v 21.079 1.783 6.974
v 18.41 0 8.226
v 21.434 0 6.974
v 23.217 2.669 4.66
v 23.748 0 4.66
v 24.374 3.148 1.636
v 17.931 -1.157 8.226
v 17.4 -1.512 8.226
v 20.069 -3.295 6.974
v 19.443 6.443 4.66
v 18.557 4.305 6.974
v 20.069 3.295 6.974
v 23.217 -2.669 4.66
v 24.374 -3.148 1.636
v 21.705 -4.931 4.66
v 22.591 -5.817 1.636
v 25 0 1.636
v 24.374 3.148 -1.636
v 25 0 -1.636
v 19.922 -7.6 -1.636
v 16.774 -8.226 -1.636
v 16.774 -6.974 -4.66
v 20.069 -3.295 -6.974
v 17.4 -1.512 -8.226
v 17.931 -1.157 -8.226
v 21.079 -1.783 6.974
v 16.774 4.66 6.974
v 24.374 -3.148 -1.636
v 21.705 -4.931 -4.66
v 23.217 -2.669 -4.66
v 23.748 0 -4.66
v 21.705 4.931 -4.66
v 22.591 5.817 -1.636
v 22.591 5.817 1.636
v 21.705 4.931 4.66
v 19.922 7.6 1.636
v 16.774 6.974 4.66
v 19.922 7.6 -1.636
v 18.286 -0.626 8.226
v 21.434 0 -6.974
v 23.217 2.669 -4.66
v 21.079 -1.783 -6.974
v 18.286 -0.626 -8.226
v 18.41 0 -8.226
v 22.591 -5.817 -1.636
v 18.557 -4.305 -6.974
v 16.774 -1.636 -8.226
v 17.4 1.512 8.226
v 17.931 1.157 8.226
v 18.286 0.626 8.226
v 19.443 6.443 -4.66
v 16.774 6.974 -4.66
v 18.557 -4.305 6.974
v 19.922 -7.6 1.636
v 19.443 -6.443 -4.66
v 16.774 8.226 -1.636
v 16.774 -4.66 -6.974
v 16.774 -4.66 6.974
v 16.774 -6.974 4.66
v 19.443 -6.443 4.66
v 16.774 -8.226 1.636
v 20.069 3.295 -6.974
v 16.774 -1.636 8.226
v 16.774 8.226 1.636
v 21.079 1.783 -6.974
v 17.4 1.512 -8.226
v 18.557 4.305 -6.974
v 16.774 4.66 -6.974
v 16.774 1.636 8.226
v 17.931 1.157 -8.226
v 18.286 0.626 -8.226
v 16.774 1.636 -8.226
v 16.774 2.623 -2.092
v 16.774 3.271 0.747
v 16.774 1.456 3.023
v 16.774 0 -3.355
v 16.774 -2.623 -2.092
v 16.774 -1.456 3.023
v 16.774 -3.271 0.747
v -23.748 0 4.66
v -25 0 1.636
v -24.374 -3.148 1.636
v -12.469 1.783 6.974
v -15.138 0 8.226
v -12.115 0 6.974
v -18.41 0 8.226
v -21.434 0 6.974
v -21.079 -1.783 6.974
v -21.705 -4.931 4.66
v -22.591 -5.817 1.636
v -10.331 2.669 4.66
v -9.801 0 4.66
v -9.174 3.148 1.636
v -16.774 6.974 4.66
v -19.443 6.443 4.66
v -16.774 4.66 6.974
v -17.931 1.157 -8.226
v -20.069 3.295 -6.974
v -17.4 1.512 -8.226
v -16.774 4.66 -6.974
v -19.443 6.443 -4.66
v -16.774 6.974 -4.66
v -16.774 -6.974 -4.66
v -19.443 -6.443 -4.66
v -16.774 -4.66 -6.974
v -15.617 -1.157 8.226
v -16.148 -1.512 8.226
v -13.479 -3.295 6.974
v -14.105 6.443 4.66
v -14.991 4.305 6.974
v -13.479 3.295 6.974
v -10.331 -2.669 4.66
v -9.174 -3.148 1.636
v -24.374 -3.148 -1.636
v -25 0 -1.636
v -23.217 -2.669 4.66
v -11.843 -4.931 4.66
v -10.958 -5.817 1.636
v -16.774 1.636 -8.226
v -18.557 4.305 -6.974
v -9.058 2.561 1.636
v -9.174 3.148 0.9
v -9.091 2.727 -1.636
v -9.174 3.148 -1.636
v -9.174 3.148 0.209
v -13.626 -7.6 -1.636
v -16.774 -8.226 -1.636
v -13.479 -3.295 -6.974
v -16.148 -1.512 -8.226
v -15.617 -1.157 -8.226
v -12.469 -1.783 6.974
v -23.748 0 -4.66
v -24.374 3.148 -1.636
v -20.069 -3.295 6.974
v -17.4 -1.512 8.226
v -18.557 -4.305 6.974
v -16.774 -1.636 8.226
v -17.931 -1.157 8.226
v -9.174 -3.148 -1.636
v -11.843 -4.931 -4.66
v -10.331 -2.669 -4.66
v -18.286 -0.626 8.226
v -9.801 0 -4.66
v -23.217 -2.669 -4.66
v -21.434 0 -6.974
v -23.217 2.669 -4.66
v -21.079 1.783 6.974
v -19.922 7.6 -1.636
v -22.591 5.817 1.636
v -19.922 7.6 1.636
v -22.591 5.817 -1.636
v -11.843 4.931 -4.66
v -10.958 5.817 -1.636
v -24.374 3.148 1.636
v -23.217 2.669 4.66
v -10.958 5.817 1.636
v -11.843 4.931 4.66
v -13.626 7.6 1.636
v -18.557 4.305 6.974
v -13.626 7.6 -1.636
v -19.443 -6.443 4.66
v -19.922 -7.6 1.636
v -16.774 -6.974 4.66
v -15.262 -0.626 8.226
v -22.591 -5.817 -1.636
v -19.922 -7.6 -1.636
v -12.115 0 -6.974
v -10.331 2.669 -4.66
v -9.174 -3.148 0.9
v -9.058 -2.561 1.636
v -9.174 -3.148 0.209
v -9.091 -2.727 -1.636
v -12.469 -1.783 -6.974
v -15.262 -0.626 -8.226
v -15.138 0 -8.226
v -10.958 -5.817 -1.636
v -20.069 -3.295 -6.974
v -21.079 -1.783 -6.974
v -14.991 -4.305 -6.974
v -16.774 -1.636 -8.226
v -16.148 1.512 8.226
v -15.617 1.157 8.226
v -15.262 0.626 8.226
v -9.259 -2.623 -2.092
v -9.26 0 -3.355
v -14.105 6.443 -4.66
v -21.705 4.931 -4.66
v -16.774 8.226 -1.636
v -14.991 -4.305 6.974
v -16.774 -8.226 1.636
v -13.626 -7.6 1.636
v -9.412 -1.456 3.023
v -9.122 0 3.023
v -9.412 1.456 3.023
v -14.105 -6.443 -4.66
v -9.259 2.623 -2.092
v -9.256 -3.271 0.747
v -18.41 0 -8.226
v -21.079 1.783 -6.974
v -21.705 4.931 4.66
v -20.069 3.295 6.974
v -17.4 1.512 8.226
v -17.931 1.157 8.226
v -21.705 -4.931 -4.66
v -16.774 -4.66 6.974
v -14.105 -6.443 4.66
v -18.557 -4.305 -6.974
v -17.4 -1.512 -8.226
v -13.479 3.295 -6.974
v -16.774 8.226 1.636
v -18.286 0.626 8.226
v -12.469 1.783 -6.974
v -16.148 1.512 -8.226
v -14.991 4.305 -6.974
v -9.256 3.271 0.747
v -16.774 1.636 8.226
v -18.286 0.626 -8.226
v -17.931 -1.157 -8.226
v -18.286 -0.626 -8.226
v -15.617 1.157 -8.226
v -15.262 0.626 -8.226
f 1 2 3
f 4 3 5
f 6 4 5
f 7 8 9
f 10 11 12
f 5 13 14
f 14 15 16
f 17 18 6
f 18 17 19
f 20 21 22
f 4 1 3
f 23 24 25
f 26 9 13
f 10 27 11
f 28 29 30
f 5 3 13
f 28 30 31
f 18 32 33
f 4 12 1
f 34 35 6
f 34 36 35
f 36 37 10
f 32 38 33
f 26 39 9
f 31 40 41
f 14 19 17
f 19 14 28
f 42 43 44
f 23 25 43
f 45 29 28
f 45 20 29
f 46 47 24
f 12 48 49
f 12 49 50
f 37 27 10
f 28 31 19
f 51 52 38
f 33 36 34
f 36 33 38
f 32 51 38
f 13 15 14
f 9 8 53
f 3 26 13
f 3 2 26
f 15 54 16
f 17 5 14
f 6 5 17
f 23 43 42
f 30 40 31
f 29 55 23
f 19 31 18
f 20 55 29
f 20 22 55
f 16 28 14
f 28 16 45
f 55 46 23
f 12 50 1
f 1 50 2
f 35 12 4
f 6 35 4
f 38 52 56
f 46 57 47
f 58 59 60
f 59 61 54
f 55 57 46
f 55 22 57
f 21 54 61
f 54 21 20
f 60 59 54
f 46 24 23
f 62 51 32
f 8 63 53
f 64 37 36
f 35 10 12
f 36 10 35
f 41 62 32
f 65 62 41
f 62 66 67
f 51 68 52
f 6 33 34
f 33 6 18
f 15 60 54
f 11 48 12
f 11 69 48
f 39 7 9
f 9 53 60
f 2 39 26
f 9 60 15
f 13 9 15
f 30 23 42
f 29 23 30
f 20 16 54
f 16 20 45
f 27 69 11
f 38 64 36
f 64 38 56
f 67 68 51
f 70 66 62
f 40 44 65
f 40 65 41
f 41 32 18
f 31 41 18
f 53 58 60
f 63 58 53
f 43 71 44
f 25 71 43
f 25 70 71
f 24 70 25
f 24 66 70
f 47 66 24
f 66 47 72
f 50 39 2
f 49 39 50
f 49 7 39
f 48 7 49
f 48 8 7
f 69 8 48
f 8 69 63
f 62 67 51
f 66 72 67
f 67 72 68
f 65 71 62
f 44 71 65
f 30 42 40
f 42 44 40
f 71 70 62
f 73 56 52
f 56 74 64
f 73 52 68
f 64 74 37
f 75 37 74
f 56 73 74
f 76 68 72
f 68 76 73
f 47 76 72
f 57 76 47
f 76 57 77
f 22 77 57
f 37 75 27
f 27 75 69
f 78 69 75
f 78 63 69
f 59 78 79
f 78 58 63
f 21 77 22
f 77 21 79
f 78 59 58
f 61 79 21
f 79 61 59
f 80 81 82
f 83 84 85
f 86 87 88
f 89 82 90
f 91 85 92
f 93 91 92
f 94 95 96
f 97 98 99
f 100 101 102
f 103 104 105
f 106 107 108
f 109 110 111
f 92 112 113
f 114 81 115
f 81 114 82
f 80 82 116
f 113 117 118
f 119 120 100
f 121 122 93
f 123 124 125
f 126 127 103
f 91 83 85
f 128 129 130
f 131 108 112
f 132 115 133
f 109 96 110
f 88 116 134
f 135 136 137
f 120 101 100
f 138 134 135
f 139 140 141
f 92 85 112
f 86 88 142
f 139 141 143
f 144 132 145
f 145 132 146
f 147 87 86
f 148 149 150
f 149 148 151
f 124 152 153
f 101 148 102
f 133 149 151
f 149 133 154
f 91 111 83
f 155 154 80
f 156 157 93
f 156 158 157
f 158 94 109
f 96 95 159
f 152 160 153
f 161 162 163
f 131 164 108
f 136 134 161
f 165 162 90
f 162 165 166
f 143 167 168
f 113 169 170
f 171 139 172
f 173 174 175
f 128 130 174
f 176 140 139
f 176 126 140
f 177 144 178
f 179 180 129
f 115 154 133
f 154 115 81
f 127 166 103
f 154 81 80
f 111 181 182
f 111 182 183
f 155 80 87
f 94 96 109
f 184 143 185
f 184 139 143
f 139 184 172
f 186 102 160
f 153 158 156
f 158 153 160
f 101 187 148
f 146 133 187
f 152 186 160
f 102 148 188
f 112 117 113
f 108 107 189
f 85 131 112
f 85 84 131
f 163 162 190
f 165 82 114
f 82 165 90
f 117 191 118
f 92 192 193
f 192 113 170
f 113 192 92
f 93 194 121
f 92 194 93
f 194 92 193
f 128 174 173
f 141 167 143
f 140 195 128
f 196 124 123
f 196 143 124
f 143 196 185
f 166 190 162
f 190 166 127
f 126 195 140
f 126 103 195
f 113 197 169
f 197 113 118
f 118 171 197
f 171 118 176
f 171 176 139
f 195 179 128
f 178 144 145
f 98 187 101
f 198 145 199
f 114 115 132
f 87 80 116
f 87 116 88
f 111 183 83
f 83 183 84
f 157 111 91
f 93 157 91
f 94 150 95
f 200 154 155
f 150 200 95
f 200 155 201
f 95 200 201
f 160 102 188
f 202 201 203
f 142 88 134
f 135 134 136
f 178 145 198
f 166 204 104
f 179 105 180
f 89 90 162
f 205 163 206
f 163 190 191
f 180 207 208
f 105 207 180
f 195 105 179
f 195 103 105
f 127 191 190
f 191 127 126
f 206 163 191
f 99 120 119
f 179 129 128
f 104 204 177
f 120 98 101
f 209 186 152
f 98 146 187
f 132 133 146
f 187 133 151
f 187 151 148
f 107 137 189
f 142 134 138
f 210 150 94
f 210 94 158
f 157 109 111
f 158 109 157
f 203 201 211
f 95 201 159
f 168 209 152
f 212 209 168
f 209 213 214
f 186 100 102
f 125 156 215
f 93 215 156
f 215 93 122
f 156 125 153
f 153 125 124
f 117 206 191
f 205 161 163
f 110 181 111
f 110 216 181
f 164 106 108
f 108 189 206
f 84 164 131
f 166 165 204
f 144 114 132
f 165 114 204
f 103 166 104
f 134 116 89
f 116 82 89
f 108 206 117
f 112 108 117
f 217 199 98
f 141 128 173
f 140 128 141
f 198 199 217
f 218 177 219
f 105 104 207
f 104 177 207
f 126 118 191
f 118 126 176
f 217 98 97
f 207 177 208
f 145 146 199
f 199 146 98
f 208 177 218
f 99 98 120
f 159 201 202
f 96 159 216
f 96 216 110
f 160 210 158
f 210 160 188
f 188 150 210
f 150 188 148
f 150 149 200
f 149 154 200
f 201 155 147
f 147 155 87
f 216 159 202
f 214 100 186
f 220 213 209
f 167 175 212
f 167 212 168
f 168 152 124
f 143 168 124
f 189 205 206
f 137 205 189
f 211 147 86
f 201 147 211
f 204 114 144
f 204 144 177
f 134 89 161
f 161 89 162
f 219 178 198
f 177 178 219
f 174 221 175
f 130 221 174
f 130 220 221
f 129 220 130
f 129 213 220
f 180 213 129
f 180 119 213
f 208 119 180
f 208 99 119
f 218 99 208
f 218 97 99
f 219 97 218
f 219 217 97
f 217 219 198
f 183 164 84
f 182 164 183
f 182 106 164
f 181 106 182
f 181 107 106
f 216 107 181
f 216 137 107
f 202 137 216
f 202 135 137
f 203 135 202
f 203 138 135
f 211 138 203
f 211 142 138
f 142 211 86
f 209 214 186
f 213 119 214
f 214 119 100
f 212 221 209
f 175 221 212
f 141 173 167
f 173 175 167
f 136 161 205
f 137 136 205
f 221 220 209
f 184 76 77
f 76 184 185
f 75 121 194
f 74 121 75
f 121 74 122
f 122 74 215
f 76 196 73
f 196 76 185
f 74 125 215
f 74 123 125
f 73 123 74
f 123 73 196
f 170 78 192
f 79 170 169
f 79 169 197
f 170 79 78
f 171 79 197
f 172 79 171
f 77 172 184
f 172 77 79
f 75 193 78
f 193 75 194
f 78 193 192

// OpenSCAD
//resize ([50,5,5])
resize ([50,0,0], auto=true)

union() {
//one weight
    translate([-10,0,0])
        difference() {  // cut weight in half
            sphere(r=5);
%           translate([0,-5,-5]) cube(10);
        }
// bar
    rotate([0,90,0]) cylinder(r=2,h=20, center=true);
// other weight
    translate([10,0,0])
        difference() { // cut weight in half in other direction
            sphere(r=5);
                translate([-10,-5,-5]) cube(10);
        }
} 
